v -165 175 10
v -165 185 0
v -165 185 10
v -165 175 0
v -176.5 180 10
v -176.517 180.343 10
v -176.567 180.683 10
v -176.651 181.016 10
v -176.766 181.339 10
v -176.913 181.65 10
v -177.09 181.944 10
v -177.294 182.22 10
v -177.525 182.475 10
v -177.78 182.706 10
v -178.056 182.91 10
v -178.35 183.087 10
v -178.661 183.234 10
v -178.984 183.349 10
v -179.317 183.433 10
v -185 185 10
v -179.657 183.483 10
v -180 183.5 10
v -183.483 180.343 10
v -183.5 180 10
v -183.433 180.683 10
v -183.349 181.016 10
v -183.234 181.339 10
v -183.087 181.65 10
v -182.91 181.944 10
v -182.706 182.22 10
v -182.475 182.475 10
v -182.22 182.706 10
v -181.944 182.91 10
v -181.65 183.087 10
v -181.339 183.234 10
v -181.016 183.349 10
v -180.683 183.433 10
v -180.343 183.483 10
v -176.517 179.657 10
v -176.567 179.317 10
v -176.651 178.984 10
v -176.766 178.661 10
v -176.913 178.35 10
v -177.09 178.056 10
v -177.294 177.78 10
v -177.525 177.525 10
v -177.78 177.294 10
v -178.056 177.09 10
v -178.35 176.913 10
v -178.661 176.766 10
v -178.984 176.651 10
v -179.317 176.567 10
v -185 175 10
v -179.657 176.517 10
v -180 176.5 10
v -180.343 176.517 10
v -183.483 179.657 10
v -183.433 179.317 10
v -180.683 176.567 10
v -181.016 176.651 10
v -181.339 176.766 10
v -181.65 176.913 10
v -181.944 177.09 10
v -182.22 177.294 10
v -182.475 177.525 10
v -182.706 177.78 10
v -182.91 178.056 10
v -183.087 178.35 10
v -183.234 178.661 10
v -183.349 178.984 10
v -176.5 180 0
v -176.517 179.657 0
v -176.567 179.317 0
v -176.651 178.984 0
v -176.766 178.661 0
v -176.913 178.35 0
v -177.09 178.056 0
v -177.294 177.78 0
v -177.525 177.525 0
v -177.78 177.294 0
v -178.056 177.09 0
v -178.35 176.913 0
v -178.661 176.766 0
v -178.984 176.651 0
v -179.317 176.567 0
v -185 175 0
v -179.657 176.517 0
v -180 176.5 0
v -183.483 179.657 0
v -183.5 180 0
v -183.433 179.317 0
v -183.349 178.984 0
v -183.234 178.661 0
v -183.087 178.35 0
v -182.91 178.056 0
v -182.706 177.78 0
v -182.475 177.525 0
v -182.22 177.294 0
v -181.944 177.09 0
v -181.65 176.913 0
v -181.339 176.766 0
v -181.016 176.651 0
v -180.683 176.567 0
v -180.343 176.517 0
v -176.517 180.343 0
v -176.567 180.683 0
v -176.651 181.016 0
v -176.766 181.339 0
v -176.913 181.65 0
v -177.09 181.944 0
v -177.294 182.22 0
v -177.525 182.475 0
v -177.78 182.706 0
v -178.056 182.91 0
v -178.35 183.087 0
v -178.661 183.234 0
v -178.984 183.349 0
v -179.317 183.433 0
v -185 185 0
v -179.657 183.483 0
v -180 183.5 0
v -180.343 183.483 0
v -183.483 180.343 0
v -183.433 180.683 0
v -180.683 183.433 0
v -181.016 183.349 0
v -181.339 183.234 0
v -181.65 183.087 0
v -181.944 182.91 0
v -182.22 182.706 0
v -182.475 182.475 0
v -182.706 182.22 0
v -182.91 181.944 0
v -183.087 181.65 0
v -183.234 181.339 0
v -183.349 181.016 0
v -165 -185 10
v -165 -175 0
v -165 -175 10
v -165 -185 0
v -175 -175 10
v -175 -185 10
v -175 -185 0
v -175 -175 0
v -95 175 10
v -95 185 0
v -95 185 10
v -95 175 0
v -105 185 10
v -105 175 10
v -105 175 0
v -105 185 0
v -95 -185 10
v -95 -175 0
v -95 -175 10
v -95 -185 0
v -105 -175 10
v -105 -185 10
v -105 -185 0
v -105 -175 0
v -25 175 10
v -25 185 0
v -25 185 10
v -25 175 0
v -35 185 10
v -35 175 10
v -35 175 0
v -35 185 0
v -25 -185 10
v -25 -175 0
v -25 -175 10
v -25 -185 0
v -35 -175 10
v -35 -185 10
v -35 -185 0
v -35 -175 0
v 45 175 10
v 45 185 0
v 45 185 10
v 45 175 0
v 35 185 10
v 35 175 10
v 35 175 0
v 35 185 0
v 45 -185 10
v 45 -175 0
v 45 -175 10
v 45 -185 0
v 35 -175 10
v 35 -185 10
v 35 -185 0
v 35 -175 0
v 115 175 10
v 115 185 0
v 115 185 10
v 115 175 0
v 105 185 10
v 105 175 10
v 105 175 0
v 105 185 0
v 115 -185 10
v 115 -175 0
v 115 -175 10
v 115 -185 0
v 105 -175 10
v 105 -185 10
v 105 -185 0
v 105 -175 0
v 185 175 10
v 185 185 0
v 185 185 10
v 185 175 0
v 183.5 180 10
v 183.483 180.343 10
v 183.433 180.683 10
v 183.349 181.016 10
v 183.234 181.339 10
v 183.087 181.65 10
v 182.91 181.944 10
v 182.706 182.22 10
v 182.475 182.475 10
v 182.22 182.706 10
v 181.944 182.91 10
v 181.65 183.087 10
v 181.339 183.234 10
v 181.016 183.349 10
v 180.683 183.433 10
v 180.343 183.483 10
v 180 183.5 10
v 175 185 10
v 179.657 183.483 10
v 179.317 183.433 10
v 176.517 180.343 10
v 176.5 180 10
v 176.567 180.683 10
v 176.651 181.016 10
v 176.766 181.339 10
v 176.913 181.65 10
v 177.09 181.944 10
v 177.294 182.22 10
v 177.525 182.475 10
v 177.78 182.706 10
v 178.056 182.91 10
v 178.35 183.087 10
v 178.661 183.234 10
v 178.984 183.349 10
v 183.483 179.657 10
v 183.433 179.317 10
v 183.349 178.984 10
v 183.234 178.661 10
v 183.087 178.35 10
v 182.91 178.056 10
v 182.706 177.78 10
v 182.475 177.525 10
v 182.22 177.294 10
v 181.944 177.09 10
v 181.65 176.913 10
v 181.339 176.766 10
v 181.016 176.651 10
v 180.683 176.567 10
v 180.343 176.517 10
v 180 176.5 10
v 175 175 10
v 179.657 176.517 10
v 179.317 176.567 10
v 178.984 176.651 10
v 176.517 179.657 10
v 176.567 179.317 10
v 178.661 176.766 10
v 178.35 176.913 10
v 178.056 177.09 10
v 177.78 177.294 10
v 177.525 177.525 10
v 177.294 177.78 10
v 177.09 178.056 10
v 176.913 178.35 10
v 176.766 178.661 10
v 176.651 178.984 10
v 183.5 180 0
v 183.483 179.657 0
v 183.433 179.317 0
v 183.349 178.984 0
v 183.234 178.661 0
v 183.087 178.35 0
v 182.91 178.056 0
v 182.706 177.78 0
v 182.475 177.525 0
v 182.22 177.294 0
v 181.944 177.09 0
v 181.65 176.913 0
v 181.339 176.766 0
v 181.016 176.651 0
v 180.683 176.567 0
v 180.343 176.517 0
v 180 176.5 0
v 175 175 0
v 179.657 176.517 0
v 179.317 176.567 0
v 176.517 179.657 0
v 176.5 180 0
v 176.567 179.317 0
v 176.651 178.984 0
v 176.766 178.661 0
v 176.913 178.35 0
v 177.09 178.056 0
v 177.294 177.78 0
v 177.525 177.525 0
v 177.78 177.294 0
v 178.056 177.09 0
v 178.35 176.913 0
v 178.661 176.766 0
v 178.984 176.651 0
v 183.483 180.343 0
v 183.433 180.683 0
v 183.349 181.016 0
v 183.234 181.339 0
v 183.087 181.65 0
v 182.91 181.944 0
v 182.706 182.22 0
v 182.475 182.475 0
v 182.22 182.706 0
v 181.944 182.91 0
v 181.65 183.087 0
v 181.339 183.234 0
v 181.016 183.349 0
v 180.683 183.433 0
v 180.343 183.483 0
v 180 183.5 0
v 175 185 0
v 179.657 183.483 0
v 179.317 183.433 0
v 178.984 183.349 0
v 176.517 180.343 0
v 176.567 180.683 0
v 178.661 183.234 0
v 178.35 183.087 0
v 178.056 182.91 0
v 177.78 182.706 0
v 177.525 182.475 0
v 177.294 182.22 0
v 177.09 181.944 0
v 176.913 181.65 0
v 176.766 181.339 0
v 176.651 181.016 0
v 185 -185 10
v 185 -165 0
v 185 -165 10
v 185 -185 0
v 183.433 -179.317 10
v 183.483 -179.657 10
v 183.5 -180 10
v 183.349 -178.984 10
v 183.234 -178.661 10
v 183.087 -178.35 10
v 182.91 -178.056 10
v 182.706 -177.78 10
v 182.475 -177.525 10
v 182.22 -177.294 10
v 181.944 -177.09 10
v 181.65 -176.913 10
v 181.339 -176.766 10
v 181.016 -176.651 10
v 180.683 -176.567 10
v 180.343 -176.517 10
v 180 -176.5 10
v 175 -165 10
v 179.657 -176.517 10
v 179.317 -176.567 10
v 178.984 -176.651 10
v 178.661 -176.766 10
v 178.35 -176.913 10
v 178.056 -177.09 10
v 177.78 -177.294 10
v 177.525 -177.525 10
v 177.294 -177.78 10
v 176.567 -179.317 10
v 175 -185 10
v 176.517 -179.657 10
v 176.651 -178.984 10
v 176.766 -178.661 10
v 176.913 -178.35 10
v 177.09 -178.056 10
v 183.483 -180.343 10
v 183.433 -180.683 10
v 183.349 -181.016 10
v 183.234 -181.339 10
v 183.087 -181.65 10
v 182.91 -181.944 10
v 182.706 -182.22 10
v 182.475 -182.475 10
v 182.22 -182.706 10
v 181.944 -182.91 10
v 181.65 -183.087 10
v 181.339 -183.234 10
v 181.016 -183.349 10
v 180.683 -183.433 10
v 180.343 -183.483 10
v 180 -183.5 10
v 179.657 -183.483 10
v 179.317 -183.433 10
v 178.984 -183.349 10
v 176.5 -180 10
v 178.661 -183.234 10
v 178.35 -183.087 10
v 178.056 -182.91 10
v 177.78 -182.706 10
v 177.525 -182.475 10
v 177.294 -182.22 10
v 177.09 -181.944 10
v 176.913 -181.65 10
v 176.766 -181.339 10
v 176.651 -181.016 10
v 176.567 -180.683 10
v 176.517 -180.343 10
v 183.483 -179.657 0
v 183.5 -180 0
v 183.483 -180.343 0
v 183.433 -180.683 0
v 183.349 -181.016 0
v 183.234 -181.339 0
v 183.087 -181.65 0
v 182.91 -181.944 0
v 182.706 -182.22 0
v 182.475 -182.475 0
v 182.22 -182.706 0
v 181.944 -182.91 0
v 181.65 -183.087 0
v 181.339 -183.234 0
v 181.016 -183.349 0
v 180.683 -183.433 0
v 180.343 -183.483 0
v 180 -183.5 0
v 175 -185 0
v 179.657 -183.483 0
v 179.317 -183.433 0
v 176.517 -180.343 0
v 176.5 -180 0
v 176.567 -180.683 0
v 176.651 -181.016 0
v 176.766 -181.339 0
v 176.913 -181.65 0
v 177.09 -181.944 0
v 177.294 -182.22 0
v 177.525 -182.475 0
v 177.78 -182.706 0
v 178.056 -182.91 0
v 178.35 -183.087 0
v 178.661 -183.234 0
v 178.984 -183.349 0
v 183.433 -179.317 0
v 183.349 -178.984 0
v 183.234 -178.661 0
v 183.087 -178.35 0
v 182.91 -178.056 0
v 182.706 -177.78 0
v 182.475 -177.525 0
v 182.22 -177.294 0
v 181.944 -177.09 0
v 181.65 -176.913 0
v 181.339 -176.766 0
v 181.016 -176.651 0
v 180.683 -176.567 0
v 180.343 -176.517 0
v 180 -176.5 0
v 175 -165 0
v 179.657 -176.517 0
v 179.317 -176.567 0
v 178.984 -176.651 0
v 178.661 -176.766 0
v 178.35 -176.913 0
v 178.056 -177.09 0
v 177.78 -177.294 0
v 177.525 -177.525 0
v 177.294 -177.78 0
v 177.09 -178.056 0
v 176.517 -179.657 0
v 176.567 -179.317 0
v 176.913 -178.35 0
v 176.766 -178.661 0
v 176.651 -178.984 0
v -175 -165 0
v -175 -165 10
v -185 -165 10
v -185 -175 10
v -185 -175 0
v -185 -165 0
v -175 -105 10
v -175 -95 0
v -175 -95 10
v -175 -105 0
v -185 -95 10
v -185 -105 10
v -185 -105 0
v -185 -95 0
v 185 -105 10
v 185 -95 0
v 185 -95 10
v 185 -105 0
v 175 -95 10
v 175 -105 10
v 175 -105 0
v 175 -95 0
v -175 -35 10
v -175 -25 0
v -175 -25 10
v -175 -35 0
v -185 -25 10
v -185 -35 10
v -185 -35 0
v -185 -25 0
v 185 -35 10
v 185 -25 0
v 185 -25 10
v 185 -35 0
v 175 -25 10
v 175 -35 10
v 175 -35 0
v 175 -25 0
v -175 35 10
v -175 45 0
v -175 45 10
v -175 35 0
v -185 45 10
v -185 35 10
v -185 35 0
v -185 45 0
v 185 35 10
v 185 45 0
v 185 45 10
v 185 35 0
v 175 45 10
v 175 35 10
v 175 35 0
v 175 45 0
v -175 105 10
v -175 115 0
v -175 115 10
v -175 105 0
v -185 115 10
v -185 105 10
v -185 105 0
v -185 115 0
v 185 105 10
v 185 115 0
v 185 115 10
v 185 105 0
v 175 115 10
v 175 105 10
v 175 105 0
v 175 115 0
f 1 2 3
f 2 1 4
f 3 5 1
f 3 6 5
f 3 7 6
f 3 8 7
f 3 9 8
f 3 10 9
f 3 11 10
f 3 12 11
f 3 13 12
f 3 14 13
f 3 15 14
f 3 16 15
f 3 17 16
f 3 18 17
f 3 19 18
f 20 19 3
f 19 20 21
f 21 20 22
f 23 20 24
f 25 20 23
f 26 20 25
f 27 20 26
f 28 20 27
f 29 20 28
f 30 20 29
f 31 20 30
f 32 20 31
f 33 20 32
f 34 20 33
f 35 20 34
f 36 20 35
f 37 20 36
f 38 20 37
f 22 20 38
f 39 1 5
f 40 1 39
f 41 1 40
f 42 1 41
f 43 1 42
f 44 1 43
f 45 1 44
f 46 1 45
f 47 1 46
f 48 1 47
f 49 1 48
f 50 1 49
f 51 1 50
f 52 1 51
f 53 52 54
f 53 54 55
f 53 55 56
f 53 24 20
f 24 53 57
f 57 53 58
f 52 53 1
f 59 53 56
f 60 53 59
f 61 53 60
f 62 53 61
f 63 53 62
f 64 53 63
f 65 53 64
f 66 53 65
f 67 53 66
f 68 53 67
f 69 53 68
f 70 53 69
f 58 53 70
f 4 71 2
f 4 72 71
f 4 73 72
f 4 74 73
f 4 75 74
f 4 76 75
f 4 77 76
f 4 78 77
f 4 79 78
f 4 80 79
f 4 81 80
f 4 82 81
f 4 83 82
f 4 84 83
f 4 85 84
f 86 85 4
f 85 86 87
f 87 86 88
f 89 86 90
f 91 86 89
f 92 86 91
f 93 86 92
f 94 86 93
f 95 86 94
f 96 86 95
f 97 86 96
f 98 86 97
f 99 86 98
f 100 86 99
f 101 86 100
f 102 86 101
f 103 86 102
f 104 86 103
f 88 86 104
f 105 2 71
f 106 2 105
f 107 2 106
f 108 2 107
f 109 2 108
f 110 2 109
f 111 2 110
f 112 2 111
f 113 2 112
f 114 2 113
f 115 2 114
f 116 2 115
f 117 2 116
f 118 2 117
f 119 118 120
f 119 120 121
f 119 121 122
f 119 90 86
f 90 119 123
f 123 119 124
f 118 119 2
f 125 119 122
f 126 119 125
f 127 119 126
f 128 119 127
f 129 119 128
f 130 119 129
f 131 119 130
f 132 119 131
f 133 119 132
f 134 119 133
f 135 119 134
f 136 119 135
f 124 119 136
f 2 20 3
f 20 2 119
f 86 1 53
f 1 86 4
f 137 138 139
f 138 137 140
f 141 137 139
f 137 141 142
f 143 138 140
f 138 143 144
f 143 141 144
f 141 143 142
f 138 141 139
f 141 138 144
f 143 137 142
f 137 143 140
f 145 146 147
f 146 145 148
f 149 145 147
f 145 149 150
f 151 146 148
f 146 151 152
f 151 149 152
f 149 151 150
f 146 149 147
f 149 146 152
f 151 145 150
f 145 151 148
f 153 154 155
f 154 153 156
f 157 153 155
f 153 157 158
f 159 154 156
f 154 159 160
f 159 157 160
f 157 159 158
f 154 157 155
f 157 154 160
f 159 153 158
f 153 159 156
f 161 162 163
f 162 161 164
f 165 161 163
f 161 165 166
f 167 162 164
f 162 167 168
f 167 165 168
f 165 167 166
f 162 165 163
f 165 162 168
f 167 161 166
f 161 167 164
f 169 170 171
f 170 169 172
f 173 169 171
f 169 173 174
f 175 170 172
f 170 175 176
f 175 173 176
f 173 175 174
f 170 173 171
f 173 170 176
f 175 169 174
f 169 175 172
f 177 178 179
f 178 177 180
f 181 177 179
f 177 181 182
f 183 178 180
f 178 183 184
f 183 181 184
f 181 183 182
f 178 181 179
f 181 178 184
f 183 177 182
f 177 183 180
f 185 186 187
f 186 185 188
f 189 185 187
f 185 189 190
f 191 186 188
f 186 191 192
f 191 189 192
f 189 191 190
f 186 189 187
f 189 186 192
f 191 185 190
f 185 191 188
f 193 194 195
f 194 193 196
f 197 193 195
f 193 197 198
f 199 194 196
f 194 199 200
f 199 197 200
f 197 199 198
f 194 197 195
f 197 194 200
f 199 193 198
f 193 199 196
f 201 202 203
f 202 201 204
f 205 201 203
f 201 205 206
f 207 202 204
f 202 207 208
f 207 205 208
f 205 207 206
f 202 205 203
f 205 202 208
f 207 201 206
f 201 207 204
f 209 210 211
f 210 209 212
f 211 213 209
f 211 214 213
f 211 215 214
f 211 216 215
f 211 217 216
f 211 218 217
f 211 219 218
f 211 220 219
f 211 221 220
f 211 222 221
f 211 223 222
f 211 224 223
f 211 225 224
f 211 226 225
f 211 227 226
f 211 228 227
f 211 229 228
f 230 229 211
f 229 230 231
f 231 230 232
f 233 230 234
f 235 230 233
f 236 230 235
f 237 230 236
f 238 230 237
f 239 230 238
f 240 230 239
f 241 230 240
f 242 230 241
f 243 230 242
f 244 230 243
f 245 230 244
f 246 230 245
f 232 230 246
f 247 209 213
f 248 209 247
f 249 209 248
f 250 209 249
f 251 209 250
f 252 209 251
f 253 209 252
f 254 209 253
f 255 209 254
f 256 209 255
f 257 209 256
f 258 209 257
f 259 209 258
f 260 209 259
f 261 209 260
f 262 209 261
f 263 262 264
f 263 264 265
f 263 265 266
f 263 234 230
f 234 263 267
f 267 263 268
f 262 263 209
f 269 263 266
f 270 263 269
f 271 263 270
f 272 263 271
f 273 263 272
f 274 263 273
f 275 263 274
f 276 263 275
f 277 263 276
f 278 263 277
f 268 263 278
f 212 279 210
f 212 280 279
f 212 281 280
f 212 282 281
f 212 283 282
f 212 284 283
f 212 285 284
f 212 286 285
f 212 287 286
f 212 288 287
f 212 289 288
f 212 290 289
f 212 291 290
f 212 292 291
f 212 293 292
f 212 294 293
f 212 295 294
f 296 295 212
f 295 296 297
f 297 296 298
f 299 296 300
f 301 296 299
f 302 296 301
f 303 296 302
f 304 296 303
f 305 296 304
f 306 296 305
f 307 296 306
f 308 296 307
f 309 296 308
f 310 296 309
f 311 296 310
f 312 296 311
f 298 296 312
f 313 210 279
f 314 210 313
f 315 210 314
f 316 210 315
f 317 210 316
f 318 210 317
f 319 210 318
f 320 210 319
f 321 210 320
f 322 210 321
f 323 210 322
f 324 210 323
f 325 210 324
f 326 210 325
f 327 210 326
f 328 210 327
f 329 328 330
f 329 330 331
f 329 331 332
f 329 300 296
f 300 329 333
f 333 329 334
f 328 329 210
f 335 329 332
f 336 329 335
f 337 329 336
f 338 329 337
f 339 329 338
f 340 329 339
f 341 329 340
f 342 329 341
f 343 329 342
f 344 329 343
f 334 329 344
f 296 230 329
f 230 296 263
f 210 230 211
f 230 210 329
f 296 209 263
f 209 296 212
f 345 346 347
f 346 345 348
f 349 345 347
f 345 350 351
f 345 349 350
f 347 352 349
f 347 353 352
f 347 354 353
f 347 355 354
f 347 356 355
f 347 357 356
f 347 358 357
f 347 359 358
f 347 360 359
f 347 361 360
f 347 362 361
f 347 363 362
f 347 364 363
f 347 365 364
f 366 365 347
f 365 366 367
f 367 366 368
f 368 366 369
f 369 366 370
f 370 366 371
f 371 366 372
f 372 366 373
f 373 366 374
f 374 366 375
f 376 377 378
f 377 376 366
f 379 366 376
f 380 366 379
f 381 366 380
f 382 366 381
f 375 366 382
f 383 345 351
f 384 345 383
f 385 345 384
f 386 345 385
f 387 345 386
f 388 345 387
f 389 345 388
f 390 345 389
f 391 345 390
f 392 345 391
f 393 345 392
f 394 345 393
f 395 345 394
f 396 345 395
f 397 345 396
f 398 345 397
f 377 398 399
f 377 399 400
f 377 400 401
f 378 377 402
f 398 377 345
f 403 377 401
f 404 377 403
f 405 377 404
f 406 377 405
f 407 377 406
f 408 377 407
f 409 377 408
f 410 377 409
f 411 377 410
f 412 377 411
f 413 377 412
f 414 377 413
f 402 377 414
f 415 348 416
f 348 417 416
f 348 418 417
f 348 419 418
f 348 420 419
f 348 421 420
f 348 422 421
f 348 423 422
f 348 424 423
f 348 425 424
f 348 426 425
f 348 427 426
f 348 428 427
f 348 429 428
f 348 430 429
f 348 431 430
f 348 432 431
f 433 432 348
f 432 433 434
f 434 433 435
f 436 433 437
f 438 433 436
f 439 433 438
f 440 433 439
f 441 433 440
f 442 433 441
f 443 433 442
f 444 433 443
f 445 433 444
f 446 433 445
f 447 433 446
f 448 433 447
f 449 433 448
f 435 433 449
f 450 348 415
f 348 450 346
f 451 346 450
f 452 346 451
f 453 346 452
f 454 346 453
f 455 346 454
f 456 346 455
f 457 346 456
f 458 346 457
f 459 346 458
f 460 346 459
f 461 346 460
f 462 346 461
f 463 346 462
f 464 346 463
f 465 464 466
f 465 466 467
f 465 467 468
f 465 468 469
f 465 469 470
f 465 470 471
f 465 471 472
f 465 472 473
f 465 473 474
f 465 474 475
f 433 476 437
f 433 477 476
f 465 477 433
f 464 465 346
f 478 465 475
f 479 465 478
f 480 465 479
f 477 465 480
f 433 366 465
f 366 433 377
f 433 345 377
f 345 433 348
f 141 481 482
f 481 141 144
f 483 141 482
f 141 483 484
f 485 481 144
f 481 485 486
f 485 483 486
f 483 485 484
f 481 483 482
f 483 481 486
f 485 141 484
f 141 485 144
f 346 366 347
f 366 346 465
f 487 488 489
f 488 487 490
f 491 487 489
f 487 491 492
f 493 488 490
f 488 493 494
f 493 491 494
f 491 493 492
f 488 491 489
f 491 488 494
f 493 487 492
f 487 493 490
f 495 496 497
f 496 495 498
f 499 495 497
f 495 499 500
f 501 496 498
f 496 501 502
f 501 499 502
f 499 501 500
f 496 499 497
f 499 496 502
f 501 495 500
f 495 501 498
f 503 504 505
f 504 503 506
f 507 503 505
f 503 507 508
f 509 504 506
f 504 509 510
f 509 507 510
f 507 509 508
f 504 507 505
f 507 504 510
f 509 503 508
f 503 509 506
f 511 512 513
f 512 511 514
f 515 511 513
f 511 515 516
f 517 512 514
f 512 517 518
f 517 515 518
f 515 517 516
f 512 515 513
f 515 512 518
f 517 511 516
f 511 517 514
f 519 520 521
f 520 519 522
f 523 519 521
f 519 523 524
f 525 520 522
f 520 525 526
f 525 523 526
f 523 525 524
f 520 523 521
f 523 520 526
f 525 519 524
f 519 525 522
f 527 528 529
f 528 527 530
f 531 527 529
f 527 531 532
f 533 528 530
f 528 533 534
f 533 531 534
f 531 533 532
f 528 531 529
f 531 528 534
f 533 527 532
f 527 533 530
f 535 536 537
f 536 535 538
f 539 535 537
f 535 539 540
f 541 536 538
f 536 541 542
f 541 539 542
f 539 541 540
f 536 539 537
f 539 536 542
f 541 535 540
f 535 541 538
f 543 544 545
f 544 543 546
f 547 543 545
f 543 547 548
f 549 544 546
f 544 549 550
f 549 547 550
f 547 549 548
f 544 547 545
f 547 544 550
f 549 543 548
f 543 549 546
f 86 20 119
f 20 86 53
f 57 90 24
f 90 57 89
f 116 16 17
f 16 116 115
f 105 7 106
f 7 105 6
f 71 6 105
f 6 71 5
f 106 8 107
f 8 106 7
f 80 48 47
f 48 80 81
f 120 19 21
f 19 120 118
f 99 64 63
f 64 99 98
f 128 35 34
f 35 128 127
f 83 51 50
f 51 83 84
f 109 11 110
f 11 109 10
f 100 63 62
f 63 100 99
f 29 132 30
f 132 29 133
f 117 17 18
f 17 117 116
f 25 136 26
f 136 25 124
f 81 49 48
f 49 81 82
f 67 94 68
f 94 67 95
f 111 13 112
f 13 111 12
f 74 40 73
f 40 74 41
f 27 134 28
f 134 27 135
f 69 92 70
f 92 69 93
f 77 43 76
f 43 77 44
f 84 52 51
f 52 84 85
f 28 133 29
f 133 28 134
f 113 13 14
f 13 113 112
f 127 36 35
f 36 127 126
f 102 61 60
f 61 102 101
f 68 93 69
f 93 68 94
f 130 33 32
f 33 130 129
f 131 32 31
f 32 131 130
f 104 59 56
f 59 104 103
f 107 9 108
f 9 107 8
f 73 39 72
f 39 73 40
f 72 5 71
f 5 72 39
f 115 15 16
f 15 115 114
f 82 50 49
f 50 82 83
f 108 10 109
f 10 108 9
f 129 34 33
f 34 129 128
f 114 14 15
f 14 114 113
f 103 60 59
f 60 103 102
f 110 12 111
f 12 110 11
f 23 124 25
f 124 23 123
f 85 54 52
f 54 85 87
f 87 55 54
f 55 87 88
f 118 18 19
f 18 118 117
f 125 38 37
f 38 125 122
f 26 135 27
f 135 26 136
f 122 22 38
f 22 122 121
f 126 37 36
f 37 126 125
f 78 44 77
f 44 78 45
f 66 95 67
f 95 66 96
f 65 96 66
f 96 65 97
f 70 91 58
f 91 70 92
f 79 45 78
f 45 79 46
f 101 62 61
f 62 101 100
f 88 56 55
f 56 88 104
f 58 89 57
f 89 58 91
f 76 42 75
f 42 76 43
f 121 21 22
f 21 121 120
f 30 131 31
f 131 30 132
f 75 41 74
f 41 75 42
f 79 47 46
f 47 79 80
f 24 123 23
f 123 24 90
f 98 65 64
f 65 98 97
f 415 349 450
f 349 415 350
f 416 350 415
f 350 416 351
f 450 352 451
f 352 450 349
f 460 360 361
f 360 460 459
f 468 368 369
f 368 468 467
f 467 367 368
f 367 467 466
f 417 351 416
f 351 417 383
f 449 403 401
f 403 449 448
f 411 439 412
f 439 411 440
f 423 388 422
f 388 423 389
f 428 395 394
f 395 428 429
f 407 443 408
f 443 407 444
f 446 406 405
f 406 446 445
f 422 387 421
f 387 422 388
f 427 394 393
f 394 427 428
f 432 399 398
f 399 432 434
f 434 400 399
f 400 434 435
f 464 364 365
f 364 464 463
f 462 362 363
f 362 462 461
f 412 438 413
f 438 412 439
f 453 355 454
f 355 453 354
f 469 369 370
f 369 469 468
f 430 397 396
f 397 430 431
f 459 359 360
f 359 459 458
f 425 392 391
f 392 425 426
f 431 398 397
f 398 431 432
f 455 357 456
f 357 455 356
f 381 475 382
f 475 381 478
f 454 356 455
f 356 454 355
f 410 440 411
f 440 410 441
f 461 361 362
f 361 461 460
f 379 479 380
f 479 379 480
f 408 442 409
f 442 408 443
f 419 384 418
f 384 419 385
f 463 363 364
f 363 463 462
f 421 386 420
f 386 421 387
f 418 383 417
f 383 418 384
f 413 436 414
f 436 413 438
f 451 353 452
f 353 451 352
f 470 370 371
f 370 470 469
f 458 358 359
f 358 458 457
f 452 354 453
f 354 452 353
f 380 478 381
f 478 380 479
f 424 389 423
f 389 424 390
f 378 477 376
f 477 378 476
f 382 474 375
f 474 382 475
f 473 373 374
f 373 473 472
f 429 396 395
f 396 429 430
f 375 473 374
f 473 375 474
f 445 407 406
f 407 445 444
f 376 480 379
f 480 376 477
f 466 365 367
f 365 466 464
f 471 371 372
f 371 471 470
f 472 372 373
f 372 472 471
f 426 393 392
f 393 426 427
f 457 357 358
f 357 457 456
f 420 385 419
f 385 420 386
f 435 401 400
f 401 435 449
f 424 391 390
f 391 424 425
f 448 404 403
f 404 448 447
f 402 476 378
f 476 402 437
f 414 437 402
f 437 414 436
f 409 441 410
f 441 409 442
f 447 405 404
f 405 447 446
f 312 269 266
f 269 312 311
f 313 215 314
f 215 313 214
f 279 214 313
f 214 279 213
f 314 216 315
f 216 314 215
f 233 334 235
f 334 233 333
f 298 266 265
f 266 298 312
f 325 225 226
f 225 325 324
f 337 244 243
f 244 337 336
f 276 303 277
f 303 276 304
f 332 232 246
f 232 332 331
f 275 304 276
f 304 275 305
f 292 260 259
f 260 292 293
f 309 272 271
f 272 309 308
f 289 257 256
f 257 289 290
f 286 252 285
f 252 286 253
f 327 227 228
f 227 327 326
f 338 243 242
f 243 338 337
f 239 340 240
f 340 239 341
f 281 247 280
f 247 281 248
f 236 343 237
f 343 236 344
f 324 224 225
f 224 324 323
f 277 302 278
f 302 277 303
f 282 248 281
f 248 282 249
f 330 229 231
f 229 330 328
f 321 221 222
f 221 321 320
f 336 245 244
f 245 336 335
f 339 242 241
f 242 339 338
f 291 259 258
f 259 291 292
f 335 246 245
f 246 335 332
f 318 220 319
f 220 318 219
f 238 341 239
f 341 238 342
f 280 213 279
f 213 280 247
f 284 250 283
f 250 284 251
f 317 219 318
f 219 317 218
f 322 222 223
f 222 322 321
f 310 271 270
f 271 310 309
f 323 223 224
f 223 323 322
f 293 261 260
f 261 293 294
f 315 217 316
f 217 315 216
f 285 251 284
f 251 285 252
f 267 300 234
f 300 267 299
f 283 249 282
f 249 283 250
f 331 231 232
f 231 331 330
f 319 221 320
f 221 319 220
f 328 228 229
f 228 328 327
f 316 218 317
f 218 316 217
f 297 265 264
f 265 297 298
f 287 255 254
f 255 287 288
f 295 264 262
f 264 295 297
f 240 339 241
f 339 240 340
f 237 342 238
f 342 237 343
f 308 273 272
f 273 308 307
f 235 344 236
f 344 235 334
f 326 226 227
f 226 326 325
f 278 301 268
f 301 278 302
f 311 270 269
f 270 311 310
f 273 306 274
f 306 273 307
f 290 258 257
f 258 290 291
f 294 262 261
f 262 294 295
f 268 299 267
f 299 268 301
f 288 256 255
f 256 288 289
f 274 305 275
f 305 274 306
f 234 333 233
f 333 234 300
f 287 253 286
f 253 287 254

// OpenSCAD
// ring_53.scad - ring index 53 (z bottom = 530 mm)
$fn = 64; bar = 10; half_b = bar/2; outer = 370; half_outer = outer/2;
front_y = 180; back_y = -180; left_x = -180; right_x = 180;
x_centers = [-170, -100, -30, 40, 110, 180];
z_centers = [5, 85, 155, 225, 295, 365, 435, 505, 575, 645, 715]; ring_z = 530;
module place_box(cx, cy, sx, sy) { translate([cx - sx/2, cy - sy/2, 0]) cube([sx, sy, bar]); }

difference() { union() {
    for (x = x_centers) { place_box(x, front_y, bar, bar); place_box(x, back_y, bar, bar); }
    for (y = x_centers) { place_box(left_x, y, bar, bar); place_box(right_x, y, bar, bar); }
    for (zc = z_centers) if ((zc - half_b < ring_z + bar) && (zc + half_b > ring_z)) {
        translate([-half_outer, front_y - half_b, 0]) cube([outer, bar, bar]);
        translate([-half_outer, back_y - half_b, 0])  cube([outer, bar, bar]);
        translate([left_x - half_b, -half_outer, 0])  cube([bar, outer, bar]);
        translate([right_x - half_b, -half_outer, 0]) cube([bar, outer, bar]);
    }
  }
  for (cx = [-180, 180]) for (cy = [-180, 180]) translate([cx, cy, 0]) cylinder(h = bar, r = 3.5, $fn = 64);
}
